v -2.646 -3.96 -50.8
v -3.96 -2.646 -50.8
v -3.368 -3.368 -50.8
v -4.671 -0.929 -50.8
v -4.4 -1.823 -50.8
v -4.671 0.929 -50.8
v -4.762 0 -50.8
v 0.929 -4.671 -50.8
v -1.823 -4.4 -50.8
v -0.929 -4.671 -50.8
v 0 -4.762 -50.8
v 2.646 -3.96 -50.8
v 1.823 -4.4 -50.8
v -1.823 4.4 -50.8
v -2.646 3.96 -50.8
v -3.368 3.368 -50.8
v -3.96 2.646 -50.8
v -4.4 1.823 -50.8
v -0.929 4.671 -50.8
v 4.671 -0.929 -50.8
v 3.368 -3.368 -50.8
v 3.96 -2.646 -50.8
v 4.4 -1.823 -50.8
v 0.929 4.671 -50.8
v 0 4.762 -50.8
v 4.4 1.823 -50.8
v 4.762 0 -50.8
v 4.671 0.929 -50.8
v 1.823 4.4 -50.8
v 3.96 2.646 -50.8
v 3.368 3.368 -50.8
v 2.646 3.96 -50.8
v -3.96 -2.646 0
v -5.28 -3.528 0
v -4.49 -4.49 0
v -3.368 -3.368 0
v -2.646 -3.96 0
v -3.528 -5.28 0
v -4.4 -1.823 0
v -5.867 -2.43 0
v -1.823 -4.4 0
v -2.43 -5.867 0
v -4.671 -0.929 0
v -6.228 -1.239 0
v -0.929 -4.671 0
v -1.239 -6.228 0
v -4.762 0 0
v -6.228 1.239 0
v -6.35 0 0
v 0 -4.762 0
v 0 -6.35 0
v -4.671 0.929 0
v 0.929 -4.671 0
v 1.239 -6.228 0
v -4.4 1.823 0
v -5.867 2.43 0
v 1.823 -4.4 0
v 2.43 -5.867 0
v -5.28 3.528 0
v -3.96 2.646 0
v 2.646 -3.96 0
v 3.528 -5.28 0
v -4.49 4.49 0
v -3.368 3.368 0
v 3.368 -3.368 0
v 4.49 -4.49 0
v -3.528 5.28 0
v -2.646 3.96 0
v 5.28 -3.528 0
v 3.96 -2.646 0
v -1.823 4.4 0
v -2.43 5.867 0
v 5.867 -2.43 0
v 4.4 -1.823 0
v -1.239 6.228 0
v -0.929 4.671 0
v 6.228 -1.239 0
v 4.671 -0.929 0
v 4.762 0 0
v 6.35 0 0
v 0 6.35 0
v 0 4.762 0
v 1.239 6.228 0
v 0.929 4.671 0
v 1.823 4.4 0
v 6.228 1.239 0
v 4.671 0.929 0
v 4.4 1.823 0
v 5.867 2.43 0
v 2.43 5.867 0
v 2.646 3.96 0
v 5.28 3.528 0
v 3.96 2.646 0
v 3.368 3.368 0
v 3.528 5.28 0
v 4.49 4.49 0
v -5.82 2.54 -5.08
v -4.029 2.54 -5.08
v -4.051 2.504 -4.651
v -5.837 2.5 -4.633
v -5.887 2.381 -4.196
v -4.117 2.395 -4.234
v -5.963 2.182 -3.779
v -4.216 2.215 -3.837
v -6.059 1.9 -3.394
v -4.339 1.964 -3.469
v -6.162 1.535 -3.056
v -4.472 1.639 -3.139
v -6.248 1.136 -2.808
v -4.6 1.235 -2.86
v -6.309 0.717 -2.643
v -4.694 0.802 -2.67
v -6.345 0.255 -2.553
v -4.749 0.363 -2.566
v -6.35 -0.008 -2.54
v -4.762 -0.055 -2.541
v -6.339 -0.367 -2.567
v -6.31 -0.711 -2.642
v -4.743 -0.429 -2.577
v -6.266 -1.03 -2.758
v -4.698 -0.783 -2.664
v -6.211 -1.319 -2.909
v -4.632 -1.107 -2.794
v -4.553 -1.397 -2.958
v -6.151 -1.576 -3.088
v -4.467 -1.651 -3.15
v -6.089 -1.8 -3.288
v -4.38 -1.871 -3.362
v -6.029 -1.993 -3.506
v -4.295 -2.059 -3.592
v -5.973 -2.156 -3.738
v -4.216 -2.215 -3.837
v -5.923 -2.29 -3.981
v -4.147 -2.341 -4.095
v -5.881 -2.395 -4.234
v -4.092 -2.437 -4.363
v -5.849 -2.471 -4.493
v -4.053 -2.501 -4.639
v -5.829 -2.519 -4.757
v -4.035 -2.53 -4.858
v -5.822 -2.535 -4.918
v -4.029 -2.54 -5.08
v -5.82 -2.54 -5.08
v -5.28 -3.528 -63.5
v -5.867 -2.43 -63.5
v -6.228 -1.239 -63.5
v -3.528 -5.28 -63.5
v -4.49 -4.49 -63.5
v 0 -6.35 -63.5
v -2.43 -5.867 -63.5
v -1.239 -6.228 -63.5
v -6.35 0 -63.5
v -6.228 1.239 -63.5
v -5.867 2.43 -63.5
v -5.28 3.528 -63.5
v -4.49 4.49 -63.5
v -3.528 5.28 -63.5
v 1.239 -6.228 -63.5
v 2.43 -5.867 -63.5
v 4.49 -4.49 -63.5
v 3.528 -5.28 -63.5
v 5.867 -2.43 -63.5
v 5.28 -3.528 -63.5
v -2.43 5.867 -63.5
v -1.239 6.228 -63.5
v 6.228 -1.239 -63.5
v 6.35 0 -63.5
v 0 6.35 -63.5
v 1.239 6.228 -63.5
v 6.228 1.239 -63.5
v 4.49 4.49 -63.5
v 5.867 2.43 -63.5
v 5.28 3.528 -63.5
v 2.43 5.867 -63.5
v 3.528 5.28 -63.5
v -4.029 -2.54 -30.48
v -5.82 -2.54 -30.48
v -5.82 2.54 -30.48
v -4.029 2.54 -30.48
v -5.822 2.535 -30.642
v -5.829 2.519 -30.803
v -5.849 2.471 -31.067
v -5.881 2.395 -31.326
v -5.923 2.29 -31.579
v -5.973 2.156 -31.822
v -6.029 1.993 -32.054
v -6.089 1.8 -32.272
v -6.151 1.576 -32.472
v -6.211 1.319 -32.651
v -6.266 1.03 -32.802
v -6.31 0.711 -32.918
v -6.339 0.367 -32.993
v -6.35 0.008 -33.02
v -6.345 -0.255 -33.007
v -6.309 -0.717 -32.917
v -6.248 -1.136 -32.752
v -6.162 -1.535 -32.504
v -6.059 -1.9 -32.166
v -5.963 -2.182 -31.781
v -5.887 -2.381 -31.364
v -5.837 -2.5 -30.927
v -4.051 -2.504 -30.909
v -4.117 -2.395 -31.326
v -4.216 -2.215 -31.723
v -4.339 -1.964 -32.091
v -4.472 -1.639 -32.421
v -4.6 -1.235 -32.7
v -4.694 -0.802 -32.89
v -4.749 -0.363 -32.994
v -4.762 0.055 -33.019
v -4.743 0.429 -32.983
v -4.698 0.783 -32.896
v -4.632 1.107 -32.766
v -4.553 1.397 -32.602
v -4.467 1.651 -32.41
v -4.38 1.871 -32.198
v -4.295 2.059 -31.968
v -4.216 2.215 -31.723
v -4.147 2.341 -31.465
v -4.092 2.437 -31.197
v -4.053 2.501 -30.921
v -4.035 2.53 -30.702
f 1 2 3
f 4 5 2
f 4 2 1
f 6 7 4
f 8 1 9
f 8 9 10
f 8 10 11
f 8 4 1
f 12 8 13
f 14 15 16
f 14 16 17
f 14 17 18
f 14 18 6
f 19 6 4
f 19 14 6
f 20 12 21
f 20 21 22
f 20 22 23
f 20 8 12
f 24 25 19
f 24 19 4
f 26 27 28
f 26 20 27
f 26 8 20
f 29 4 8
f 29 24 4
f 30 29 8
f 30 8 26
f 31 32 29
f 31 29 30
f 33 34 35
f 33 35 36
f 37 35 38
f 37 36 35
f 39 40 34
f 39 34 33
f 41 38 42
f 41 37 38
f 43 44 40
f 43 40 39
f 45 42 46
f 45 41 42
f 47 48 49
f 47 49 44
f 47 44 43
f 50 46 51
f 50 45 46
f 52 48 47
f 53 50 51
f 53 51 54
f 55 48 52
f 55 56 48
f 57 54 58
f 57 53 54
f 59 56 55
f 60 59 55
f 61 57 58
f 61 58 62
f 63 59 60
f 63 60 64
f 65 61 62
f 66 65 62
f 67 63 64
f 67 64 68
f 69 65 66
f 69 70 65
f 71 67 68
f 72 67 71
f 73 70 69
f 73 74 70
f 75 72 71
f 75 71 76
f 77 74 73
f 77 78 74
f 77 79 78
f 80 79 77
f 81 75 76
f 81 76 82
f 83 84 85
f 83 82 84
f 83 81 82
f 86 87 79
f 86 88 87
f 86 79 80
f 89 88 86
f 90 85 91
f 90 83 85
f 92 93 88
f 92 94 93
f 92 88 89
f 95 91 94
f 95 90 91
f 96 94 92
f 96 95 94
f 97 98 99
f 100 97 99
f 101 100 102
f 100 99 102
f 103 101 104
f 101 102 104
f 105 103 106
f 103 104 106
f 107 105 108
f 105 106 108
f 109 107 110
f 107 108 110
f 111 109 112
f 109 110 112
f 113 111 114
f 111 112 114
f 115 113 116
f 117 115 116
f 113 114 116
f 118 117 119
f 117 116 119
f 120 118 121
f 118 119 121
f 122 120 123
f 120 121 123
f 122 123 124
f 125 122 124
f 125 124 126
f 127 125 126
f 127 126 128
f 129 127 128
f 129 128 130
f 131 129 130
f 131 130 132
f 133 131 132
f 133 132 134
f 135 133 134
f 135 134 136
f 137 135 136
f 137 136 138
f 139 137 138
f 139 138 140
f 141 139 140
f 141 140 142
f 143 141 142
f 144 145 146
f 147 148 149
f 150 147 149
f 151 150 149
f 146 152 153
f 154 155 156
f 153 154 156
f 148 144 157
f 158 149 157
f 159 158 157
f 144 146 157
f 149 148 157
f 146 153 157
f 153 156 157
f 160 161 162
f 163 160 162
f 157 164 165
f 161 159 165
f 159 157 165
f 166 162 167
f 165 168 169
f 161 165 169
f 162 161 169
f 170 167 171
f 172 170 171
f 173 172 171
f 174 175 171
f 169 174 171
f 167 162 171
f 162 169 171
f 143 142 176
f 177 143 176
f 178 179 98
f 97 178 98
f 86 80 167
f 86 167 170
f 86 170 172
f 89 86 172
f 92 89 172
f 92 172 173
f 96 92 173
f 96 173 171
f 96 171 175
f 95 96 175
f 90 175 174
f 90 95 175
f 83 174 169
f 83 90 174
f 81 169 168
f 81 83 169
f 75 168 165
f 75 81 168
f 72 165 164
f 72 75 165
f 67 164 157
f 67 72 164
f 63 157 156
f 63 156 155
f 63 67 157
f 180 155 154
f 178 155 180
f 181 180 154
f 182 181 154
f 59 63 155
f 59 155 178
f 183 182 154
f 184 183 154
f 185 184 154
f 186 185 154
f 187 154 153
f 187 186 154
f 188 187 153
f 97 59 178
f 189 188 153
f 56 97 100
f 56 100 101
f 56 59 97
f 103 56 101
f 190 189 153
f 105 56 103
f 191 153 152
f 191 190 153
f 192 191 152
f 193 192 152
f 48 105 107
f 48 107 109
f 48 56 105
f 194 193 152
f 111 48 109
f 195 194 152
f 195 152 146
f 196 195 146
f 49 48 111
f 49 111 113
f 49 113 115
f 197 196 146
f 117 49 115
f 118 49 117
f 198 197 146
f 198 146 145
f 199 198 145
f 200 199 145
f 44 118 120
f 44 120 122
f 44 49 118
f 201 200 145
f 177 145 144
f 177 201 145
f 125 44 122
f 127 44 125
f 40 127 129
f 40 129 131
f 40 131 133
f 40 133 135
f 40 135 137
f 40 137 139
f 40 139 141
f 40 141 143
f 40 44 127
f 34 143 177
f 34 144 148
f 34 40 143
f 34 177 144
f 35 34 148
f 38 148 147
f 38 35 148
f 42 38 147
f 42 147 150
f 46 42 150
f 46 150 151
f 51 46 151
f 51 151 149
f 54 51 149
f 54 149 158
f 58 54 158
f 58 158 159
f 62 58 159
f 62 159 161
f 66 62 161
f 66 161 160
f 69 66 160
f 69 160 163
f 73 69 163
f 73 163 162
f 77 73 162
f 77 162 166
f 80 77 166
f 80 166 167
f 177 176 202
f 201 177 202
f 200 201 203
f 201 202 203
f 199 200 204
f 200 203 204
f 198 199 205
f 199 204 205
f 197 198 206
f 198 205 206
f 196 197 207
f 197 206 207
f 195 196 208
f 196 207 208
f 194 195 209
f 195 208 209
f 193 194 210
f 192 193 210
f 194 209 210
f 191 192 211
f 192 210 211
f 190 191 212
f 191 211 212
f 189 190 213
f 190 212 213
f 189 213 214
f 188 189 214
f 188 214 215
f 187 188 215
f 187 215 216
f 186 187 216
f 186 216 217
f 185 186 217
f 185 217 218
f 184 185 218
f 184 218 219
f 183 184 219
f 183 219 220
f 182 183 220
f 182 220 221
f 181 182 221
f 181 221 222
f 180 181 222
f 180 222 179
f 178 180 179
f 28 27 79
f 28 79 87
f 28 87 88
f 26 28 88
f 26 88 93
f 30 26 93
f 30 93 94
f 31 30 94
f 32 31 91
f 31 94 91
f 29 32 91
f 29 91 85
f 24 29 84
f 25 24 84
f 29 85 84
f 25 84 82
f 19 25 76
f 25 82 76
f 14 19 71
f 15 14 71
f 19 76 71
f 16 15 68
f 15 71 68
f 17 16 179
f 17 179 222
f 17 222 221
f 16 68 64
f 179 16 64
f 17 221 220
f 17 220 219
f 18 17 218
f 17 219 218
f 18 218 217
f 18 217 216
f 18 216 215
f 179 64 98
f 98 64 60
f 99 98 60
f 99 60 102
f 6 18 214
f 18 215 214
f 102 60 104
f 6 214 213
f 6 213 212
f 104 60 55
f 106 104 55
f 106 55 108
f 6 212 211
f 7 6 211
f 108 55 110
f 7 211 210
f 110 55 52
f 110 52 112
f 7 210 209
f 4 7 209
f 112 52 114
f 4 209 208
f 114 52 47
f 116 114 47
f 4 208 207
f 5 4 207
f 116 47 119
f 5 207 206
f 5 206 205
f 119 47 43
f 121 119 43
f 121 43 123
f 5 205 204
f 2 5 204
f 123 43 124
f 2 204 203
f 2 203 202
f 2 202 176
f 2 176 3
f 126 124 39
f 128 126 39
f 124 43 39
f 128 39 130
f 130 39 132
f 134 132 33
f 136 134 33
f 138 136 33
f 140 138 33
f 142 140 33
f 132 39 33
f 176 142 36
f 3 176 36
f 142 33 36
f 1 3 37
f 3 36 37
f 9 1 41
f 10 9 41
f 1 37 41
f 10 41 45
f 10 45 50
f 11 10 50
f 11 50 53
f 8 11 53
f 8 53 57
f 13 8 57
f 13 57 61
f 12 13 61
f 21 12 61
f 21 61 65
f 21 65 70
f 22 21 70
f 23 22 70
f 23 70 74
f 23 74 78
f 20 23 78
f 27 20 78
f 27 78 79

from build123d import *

# Parameters (mm, degrees)
F0_R     = 6.35
F0_R_2   = 4.7625
F1_DEPTH = 63.5
F2_DEPTH = 50.8
F4_DEPTH = 25.4


with BuildPart() as f1:
    # F0 (on Top) → F1 (new body)
    with BuildSketch(Plane.XY):
        Circle(F0_R)
        Circle(F0_R_2, mode=Mode.SUBTRACT)
        Circle(F0_R_2)
    extrude(amount=-F1_DEPTH)

    # F0 (on Top) → F2 (cut)
    with BuildSketch(Plane.XY):
        Circle(F0_R_2)
    extrude(amount=-F2_DEPTH, mode=Mode.SUBTRACT)

    # F3 (on Right) → F4 (cut)
    with BuildSketch(Plane.YZ):
        with BuildLine():
            Line((2.54, -30.48), (2.54, -5.08))
            ThreePointArc((2.54, -5.08), (0, -2.54), (-2.54, -5.08))
            Line((-2.54, -5.08), (-2.54, -30.48))
            ThreePointArc((-2.54, -30.48), (0, -33.02), (2.54, -30.48))
        make_face()
    extrude(amount=-F4_DEPTH, mode=Mode.SUBTRACT)


solid = f1.part
